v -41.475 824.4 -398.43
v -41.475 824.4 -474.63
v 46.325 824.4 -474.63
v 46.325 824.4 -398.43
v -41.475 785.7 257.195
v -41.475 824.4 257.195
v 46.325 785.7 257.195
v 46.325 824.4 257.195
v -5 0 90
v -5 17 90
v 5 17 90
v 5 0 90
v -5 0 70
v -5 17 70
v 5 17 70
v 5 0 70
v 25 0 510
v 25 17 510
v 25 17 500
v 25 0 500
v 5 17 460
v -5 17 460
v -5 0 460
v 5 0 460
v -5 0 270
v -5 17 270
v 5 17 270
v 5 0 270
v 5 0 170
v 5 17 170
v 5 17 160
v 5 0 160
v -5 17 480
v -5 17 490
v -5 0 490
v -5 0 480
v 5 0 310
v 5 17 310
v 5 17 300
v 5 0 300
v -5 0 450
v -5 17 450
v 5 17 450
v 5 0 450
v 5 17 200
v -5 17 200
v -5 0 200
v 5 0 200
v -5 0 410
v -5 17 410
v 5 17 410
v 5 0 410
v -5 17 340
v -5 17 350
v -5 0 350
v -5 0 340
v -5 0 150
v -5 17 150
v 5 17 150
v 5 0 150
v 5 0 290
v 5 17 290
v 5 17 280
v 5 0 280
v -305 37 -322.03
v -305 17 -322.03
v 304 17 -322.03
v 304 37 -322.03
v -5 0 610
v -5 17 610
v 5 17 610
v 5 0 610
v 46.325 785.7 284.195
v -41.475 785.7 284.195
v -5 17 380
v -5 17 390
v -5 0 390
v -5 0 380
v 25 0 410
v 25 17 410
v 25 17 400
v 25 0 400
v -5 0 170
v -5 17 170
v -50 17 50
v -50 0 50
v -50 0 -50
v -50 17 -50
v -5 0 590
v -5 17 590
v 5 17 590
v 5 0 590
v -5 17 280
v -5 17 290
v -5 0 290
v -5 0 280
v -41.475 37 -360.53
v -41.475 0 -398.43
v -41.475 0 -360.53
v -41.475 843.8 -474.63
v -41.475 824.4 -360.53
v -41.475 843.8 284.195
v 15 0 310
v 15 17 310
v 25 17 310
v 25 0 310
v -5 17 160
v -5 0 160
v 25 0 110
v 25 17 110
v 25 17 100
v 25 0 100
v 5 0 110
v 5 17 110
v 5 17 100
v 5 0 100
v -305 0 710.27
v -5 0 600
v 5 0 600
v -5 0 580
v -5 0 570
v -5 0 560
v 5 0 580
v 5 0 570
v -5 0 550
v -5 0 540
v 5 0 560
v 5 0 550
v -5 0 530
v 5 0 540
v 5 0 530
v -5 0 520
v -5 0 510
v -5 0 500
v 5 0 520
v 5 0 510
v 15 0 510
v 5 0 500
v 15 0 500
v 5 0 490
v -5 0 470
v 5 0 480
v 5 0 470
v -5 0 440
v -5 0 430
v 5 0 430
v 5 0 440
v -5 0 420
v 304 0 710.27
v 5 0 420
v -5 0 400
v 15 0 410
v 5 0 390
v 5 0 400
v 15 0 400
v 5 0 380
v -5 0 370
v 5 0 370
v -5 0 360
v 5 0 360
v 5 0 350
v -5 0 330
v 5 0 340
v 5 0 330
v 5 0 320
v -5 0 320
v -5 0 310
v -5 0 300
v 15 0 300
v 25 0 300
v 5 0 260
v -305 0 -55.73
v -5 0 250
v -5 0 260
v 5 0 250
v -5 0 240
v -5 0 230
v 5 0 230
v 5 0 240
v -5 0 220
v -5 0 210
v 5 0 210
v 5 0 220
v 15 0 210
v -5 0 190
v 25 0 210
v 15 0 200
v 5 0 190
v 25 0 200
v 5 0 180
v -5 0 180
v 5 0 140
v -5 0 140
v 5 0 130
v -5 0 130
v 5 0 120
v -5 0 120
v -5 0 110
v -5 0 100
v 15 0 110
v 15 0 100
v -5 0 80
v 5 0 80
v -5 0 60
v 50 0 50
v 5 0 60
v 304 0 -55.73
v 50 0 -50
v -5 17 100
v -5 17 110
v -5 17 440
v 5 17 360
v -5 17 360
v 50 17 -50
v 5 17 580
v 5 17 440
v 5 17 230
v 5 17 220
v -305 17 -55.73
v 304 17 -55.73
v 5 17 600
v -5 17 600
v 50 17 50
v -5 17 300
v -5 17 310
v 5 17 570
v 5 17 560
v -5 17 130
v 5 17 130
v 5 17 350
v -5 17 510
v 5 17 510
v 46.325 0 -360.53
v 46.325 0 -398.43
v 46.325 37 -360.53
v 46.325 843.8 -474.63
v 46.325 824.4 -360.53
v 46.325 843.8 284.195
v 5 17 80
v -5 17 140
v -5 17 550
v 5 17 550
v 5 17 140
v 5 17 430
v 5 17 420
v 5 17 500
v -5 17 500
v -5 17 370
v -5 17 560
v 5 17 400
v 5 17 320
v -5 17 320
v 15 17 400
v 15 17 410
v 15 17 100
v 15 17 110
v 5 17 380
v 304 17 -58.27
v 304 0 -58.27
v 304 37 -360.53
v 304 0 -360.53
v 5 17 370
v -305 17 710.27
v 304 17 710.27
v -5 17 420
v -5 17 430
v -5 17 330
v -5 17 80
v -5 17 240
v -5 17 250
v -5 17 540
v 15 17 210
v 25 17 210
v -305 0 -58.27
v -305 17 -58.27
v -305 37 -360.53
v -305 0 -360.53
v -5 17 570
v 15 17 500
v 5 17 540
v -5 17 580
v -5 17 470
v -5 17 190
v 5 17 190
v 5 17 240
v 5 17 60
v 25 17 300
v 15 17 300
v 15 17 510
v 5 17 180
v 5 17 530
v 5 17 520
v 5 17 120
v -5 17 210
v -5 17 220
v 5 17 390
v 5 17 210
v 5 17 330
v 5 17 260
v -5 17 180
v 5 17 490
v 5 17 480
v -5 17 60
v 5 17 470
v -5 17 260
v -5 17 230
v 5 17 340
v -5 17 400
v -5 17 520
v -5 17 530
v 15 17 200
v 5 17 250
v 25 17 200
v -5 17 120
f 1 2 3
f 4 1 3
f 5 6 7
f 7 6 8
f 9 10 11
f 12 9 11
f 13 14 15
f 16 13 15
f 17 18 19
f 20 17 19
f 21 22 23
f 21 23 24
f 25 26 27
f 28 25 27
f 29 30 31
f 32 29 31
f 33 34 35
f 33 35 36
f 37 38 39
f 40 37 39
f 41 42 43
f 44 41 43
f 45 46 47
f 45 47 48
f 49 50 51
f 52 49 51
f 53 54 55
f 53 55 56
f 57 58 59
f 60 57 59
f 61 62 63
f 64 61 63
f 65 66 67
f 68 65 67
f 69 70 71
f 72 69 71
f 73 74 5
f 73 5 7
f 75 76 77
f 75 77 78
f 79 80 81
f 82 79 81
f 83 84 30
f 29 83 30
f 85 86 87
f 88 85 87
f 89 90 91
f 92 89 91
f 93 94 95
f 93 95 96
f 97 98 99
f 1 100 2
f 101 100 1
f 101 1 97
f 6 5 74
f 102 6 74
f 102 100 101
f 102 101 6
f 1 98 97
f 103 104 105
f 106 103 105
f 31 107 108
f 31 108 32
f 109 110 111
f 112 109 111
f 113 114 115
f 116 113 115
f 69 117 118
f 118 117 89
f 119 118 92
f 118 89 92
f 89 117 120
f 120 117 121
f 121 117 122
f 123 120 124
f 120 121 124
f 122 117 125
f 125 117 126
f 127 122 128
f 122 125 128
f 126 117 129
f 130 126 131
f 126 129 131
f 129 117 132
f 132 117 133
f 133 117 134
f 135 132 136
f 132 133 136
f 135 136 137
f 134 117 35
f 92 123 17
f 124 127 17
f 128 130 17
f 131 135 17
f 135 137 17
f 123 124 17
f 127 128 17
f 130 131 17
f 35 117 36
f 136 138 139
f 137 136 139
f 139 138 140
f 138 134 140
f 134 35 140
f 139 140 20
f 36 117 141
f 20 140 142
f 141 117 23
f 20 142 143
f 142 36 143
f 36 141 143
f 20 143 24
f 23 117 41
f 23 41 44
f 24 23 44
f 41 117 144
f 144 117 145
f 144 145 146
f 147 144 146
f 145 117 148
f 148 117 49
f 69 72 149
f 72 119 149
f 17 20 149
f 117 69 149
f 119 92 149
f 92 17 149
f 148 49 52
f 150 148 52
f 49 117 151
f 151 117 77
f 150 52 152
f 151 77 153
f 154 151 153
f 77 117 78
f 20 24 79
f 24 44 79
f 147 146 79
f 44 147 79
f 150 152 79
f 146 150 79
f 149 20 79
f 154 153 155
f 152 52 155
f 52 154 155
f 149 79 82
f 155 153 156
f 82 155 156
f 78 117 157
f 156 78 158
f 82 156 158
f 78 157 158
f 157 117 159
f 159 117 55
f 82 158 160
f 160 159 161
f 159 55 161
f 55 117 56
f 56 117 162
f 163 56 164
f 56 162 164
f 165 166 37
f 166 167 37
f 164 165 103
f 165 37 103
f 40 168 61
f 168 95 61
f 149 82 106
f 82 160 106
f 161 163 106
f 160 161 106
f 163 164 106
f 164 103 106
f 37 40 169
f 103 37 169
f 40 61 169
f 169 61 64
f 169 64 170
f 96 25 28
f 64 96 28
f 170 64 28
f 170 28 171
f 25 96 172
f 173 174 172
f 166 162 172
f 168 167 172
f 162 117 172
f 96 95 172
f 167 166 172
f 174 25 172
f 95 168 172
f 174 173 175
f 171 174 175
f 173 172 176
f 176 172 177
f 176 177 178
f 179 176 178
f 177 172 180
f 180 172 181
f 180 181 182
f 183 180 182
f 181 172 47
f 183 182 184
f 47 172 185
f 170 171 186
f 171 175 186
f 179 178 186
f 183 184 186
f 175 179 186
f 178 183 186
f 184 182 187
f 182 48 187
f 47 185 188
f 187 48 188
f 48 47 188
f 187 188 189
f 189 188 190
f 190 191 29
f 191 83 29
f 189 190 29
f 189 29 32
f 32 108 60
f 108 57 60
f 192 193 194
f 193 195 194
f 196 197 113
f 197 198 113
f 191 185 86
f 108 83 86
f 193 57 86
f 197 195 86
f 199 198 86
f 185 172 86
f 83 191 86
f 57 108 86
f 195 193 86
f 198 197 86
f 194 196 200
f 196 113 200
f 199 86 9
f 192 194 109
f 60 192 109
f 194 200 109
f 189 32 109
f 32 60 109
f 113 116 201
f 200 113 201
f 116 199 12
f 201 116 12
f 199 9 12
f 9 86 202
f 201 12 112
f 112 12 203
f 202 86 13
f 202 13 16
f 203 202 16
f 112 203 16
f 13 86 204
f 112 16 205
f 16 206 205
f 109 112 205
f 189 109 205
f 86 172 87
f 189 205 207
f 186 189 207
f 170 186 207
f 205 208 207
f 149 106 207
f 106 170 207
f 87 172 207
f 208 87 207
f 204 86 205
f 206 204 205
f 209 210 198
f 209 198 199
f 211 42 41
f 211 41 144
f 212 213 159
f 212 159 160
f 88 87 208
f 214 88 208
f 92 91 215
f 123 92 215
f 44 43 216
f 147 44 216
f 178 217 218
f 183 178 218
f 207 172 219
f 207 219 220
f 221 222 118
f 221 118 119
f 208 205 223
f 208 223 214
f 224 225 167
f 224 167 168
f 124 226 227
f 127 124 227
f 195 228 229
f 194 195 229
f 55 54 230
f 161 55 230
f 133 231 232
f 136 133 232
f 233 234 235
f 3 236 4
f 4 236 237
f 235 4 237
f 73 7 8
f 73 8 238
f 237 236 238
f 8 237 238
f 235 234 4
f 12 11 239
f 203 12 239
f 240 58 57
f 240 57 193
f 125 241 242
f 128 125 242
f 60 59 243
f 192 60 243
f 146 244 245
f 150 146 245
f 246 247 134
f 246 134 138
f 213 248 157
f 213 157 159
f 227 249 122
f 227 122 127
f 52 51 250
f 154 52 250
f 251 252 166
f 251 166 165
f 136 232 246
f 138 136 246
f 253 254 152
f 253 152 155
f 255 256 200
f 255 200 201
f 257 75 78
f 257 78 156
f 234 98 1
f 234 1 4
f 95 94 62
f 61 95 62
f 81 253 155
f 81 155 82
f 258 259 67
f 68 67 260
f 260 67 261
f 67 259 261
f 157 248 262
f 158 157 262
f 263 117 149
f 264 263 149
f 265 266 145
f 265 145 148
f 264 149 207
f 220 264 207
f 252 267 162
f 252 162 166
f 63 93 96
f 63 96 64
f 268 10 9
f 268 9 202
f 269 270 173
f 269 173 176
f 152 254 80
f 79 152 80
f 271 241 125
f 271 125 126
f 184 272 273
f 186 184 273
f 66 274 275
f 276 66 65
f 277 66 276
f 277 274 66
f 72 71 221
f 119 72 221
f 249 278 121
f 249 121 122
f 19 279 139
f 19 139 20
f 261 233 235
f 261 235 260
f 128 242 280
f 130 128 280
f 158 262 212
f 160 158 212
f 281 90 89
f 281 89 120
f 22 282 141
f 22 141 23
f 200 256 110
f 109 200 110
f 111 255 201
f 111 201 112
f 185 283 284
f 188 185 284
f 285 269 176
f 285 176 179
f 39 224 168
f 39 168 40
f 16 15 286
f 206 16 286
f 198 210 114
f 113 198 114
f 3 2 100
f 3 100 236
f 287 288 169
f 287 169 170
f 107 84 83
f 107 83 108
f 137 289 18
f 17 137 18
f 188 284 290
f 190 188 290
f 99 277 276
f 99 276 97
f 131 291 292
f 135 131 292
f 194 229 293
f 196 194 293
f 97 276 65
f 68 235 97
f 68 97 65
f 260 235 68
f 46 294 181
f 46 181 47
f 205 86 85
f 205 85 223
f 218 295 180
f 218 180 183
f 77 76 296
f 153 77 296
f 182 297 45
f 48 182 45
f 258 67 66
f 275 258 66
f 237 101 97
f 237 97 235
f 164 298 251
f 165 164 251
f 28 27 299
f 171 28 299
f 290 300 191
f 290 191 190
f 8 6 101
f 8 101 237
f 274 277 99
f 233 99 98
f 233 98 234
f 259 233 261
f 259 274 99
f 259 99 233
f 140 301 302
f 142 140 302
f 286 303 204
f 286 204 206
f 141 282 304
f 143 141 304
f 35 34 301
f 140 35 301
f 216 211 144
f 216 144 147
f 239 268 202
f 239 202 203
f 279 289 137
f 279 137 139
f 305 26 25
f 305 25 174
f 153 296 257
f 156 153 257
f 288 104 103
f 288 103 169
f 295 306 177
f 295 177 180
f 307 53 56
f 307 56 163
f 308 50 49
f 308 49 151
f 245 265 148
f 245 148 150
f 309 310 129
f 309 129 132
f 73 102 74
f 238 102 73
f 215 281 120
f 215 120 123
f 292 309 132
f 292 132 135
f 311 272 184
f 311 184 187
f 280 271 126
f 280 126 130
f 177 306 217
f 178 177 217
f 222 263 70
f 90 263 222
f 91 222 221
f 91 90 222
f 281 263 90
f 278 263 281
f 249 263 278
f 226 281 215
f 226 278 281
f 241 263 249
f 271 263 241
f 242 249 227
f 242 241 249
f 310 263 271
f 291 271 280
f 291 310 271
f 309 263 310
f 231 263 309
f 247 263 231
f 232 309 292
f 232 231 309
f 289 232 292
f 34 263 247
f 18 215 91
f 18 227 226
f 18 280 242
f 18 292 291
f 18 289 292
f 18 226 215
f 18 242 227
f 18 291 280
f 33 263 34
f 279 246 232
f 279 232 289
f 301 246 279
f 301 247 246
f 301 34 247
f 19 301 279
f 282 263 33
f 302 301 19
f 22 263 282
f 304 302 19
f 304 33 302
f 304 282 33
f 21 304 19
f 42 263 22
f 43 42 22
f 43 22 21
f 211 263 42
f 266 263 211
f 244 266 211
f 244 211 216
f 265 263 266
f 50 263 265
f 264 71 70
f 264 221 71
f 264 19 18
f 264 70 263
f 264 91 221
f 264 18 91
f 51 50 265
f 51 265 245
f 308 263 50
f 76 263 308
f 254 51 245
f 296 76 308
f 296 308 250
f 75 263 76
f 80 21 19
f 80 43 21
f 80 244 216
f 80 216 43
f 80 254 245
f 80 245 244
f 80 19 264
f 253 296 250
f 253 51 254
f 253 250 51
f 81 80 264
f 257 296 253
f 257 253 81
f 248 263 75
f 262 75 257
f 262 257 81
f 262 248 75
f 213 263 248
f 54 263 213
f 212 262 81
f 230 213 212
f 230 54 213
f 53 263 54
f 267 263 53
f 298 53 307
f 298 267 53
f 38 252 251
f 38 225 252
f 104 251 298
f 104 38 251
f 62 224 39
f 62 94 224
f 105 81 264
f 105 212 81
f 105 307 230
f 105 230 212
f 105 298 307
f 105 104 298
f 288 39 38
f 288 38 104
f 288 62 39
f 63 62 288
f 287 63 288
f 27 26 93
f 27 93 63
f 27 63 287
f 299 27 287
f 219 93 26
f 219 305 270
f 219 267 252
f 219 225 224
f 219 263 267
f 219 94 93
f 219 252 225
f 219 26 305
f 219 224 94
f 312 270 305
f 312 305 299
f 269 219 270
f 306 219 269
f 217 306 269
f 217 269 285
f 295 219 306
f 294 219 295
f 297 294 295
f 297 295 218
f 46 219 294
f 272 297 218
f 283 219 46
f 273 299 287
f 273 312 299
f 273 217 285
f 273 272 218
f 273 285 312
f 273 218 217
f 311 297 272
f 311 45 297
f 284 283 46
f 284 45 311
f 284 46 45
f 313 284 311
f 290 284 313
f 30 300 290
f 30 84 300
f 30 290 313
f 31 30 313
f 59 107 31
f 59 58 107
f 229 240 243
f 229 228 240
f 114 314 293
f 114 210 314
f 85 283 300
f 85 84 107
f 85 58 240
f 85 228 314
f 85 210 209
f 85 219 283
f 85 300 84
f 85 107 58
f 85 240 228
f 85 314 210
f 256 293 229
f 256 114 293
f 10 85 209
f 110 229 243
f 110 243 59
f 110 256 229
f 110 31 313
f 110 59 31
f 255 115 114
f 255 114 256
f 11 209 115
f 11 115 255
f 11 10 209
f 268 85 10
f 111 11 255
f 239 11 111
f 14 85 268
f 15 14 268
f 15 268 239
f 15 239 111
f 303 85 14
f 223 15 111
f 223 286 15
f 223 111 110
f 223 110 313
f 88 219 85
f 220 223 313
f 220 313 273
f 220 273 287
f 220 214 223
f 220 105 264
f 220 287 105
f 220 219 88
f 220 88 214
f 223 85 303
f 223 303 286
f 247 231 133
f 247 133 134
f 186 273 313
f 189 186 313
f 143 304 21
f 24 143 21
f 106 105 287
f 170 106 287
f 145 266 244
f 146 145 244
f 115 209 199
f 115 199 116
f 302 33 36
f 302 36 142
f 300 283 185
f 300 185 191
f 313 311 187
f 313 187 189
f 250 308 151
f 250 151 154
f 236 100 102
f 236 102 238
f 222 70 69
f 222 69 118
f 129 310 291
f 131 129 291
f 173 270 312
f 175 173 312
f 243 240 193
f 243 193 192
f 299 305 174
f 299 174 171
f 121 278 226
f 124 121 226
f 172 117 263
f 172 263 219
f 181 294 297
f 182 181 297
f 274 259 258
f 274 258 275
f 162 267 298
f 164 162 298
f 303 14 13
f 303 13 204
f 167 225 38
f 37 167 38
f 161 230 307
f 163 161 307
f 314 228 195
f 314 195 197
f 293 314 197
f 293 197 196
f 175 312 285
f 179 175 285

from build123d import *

# Parameters (mm, degrees)
SKETCH1_W           = 609
SKETCH1_H           = 766
SKETCH1_W_2         = 10
SKETCH1_H_2         = 10
SKETCH1_W_3         = 100
SKETCH1_H_3         = 100
BOSS_EXTRUDE1_DEPTH = 17
SKETCH2_W           = 609
SKETCH2_H           = 302.26
BOSS_EXTRUDE2_DEPTH = 17
SKETCH3_W           = 609
SKETCH3_H           = 38.5
BOSS_EXTRUDE3_DEPTH = 20
SKETCH4_W           = 87.8
SKETCH4_H           = 37.9
BOSS_EXTRUDE4_DEPTH = 824.4
SKETCH5_W           = 87.8
SKETCH5_H           = 758.825
BOSS_EXTRUDE5_DEPTH = 19.4
SKETCH6_W           = 87.8
SKETCH6_H           = 27
BOSS_EXTRUDE6_DEPTH = 38.7


with BuildPart() as part:
    # Sketch1 → Boss-Extrude1 (new body)
    with BuildSketch(Plane(origin=(0, 0, 0), x_dir=(1, 0, 0), z_dir=(0, 1, 0))):
        with Locations((-0.5, -327.27)):
            Rectangle(SKETCH1_W, SKETCH1_H)
        with Locations((0, -85)):
            Rectangle(SKETCH1_W_2, SKETCH1_H_2, mode=Mode.SUBTRACT)
        Rectangle(SKETCH1_W_3, SKETCH1_H_3, mode=Mode.SUBTRACT)
        with Locations((0, -65)):
            Rectangle(SKETCH1_W_2, SKETCH1_H_2, mode=Mode.SUBTRACT)
        with Locations((0, -105)):
            Rectangle(SKETCH1_W_2, SKETCH1_H_2, mode=Mode.SUBTRACT)
        with Locations((0, -125)):
            Rectangle(SKETCH1_W_2, SKETCH1_H_2, mode=Mode.SUBTRACT)
        with Locations((0, -145)):
            Rectangle(SKETCH1_W_2, SKETCH1_H_2, mode=Mode.SUBTRACT)
        with Locations((0, -165)):
            Rectangle(SKETCH1_W_2, SKETCH1_H_2, mode=Mode.SUBTRACT)
        with Locations((0, -185)):
            Rectangle(SKETCH1_W_2, SKETCH1_H_2, mode=Mode.SUBTRACT)
        with Locations((0, -205)):
            Rectangle(SKETCH1_W_2, SKETCH1_H_2, mode=Mode.SUBTRACT)
        with Locations((0, -225)):
            Rectangle(SKETCH1_W_2, SKETCH1_H_2, mode=Mode.SUBTRACT)
        with Locations((0, -245)):
            Rectangle(SKETCH1_W_2, SKETCH1_H_2, mode=Mode.SUBTRACT)
        with Locations((0, -265)):
            Rectangle(SKETCH1_W_2, SKETCH1_H_2, mode=Mode.SUBTRACT)
        with Locations((0, -285)):
            Rectangle(SKETCH1_W_2, SKETCH1_H_2, mode=Mode.SUBTRACT)
        with Locations((0, -305)):
            Rectangle(SKETCH1_W_2, SKETCH1_H_2, mode=Mode.SUBTRACT)
        with Locations((0, -325)):
            Rectangle(SKETCH1_W_2, SKETCH1_H_2, mode=Mode.SUBTRACT)
        with Locations((0, -345)):
            Rectangle(SKETCH1_W_2, SKETCH1_H_2, mode=Mode.SUBTRACT)
        with Locations((0, -365)):
            Rectangle(SKETCH1_W_2, SKETCH1_H_2, mode=Mode.SUBTRACT)
        with Locations((0, -385)):
            Rectangle(SKETCH1_W_2, SKETCH1_H_2, mode=Mode.SUBTRACT)
        with Locations((0, -405)):
            Rectangle(SKETCH1_W_2, SKETCH1_H_2, mode=Mode.SUBTRACT)
        with Locations((0, -425)):
            Rectangle(SKETCH1_W_2, SKETCH1_H_2, mode=Mode.SUBTRACT)
        with Locations((0, -445)):
            Rectangle(SKETCH1_W_2, SKETCH1_H_2, mode=Mode.SUBTRACT)
        with Locations((0, -465)):
            Rectangle(SKETCH1_W_2, SKETCH1_H_2, mode=Mode.SUBTRACT)
        with Locations((0, -485)):
            Rectangle(SKETCH1_W_2, SKETCH1_H_2, mode=Mode.SUBTRACT)
        with Locations((0, -505)):
            Rectangle(SKETCH1_W_2, SKETCH1_H_2, mode=Mode.SUBTRACT)
        with Locations((0, -525)):
            Rectangle(SKETCH1_W_2, SKETCH1_H_2, mode=Mode.SUBTRACT)
        with Locations((0, -545)):
            Rectangle(SKETCH1_W_2, SKETCH1_H_2, mode=Mode.SUBTRACT)
        with Locations((0, -565)):
            Rectangle(SKETCH1_W_2, SKETCH1_H_2, mode=Mode.SUBTRACT)
        with Locations((0, -585)):
            Rectangle(SKETCH1_W_2, SKETCH1_H_2, mode=Mode.SUBTRACT)
        with Locations((0, -605)):
            Rectangle(SKETCH1_W_2, SKETCH1_H_2, mode=Mode.SUBTRACT)
        with Locations((20, -105)):
            Rectangle(SKETCH1_W_2, SKETCH1_H_2, mode=Mode.SUBTRACT)
        with Locations((20, -205)):
            Rectangle(SKETCH1_W_2, SKETCH1_H_2, mode=Mode.SUBTRACT)
        with Locations((20, -305)):
            Rectangle(SKETCH1_W_2, SKETCH1_H_2, mode=Mode.SUBTRACT)
        with Locations((20, -405)):
            Rectangle(SKETCH1_W_2, SKETCH1_H_2, mode=Mode.SUBTRACT)
        with Locations((20, -505)):
            Rectangle(SKETCH1_W_2, SKETCH1_H_2, mode=Mode.SUBTRACT)
    extrude(amount=BOSS_EXTRUDE1_DEPTH)


with BuildPart() as body_2:
    # Sketch2 → Boss-Extrude2 (new body)
    with BuildSketch(Plane(origin=(0, 0, 0), x_dir=(-1, 0, 0), z_dir=(0, -1, 0))):
        with Locations((0.5, 209.4)):
            Rectangle(SKETCH2_W, SKETCH2_H)
    extrude(amount=-BOSS_EXTRUDE2_DEPTH)

    # Sketch3 → Boss-Extrude3 (add)
    with BuildSketch(Plane(origin=(0, 17, 0), x_dir=(1, 0, 0), z_dir=(0, 1, 0))):
        with Locations((-0.5, 341.28)):
            Rectangle(SKETCH3_W, SKETCH3_H)
    extrude(amount=BOSS_EXTRUDE3_DEPTH)

    # Sketch4 → Boss-Extrude4 (add)
    with BuildSketch(Plane.XZ):
        with Locations((2.425, -379.48)):
            Rectangle(SKETCH4_W, SKETCH4_H)
    extrude(amount=-BOSS_EXTRUDE4_DEPTH)

    # Sketch5 → Boss-Extrude5 (add)
    with BuildSketch(Plane(origin=(0, 824.4, 0), x_dir=(1, 0, 0), z_dir=(0, 1, 0))):
        with Locations((2.425, 95.2175)):
            Rectangle(SKETCH5_W, SKETCH5_H)
    extrude(amount=BOSS_EXTRUDE5_DEPTH)

    # Sketch6 → Boss-Extrude6 (add)
    with BuildSketch(Plane.XZ.offset(-824.4)):
        with Locations((2.425, 270.695)):
            Rectangle(SKETCH6_W, SKETCH6_H)
    extrude(amount=BOSS_EXTRUDE6_DEPTH)


solid = Compound([part.part, body_2.part])
